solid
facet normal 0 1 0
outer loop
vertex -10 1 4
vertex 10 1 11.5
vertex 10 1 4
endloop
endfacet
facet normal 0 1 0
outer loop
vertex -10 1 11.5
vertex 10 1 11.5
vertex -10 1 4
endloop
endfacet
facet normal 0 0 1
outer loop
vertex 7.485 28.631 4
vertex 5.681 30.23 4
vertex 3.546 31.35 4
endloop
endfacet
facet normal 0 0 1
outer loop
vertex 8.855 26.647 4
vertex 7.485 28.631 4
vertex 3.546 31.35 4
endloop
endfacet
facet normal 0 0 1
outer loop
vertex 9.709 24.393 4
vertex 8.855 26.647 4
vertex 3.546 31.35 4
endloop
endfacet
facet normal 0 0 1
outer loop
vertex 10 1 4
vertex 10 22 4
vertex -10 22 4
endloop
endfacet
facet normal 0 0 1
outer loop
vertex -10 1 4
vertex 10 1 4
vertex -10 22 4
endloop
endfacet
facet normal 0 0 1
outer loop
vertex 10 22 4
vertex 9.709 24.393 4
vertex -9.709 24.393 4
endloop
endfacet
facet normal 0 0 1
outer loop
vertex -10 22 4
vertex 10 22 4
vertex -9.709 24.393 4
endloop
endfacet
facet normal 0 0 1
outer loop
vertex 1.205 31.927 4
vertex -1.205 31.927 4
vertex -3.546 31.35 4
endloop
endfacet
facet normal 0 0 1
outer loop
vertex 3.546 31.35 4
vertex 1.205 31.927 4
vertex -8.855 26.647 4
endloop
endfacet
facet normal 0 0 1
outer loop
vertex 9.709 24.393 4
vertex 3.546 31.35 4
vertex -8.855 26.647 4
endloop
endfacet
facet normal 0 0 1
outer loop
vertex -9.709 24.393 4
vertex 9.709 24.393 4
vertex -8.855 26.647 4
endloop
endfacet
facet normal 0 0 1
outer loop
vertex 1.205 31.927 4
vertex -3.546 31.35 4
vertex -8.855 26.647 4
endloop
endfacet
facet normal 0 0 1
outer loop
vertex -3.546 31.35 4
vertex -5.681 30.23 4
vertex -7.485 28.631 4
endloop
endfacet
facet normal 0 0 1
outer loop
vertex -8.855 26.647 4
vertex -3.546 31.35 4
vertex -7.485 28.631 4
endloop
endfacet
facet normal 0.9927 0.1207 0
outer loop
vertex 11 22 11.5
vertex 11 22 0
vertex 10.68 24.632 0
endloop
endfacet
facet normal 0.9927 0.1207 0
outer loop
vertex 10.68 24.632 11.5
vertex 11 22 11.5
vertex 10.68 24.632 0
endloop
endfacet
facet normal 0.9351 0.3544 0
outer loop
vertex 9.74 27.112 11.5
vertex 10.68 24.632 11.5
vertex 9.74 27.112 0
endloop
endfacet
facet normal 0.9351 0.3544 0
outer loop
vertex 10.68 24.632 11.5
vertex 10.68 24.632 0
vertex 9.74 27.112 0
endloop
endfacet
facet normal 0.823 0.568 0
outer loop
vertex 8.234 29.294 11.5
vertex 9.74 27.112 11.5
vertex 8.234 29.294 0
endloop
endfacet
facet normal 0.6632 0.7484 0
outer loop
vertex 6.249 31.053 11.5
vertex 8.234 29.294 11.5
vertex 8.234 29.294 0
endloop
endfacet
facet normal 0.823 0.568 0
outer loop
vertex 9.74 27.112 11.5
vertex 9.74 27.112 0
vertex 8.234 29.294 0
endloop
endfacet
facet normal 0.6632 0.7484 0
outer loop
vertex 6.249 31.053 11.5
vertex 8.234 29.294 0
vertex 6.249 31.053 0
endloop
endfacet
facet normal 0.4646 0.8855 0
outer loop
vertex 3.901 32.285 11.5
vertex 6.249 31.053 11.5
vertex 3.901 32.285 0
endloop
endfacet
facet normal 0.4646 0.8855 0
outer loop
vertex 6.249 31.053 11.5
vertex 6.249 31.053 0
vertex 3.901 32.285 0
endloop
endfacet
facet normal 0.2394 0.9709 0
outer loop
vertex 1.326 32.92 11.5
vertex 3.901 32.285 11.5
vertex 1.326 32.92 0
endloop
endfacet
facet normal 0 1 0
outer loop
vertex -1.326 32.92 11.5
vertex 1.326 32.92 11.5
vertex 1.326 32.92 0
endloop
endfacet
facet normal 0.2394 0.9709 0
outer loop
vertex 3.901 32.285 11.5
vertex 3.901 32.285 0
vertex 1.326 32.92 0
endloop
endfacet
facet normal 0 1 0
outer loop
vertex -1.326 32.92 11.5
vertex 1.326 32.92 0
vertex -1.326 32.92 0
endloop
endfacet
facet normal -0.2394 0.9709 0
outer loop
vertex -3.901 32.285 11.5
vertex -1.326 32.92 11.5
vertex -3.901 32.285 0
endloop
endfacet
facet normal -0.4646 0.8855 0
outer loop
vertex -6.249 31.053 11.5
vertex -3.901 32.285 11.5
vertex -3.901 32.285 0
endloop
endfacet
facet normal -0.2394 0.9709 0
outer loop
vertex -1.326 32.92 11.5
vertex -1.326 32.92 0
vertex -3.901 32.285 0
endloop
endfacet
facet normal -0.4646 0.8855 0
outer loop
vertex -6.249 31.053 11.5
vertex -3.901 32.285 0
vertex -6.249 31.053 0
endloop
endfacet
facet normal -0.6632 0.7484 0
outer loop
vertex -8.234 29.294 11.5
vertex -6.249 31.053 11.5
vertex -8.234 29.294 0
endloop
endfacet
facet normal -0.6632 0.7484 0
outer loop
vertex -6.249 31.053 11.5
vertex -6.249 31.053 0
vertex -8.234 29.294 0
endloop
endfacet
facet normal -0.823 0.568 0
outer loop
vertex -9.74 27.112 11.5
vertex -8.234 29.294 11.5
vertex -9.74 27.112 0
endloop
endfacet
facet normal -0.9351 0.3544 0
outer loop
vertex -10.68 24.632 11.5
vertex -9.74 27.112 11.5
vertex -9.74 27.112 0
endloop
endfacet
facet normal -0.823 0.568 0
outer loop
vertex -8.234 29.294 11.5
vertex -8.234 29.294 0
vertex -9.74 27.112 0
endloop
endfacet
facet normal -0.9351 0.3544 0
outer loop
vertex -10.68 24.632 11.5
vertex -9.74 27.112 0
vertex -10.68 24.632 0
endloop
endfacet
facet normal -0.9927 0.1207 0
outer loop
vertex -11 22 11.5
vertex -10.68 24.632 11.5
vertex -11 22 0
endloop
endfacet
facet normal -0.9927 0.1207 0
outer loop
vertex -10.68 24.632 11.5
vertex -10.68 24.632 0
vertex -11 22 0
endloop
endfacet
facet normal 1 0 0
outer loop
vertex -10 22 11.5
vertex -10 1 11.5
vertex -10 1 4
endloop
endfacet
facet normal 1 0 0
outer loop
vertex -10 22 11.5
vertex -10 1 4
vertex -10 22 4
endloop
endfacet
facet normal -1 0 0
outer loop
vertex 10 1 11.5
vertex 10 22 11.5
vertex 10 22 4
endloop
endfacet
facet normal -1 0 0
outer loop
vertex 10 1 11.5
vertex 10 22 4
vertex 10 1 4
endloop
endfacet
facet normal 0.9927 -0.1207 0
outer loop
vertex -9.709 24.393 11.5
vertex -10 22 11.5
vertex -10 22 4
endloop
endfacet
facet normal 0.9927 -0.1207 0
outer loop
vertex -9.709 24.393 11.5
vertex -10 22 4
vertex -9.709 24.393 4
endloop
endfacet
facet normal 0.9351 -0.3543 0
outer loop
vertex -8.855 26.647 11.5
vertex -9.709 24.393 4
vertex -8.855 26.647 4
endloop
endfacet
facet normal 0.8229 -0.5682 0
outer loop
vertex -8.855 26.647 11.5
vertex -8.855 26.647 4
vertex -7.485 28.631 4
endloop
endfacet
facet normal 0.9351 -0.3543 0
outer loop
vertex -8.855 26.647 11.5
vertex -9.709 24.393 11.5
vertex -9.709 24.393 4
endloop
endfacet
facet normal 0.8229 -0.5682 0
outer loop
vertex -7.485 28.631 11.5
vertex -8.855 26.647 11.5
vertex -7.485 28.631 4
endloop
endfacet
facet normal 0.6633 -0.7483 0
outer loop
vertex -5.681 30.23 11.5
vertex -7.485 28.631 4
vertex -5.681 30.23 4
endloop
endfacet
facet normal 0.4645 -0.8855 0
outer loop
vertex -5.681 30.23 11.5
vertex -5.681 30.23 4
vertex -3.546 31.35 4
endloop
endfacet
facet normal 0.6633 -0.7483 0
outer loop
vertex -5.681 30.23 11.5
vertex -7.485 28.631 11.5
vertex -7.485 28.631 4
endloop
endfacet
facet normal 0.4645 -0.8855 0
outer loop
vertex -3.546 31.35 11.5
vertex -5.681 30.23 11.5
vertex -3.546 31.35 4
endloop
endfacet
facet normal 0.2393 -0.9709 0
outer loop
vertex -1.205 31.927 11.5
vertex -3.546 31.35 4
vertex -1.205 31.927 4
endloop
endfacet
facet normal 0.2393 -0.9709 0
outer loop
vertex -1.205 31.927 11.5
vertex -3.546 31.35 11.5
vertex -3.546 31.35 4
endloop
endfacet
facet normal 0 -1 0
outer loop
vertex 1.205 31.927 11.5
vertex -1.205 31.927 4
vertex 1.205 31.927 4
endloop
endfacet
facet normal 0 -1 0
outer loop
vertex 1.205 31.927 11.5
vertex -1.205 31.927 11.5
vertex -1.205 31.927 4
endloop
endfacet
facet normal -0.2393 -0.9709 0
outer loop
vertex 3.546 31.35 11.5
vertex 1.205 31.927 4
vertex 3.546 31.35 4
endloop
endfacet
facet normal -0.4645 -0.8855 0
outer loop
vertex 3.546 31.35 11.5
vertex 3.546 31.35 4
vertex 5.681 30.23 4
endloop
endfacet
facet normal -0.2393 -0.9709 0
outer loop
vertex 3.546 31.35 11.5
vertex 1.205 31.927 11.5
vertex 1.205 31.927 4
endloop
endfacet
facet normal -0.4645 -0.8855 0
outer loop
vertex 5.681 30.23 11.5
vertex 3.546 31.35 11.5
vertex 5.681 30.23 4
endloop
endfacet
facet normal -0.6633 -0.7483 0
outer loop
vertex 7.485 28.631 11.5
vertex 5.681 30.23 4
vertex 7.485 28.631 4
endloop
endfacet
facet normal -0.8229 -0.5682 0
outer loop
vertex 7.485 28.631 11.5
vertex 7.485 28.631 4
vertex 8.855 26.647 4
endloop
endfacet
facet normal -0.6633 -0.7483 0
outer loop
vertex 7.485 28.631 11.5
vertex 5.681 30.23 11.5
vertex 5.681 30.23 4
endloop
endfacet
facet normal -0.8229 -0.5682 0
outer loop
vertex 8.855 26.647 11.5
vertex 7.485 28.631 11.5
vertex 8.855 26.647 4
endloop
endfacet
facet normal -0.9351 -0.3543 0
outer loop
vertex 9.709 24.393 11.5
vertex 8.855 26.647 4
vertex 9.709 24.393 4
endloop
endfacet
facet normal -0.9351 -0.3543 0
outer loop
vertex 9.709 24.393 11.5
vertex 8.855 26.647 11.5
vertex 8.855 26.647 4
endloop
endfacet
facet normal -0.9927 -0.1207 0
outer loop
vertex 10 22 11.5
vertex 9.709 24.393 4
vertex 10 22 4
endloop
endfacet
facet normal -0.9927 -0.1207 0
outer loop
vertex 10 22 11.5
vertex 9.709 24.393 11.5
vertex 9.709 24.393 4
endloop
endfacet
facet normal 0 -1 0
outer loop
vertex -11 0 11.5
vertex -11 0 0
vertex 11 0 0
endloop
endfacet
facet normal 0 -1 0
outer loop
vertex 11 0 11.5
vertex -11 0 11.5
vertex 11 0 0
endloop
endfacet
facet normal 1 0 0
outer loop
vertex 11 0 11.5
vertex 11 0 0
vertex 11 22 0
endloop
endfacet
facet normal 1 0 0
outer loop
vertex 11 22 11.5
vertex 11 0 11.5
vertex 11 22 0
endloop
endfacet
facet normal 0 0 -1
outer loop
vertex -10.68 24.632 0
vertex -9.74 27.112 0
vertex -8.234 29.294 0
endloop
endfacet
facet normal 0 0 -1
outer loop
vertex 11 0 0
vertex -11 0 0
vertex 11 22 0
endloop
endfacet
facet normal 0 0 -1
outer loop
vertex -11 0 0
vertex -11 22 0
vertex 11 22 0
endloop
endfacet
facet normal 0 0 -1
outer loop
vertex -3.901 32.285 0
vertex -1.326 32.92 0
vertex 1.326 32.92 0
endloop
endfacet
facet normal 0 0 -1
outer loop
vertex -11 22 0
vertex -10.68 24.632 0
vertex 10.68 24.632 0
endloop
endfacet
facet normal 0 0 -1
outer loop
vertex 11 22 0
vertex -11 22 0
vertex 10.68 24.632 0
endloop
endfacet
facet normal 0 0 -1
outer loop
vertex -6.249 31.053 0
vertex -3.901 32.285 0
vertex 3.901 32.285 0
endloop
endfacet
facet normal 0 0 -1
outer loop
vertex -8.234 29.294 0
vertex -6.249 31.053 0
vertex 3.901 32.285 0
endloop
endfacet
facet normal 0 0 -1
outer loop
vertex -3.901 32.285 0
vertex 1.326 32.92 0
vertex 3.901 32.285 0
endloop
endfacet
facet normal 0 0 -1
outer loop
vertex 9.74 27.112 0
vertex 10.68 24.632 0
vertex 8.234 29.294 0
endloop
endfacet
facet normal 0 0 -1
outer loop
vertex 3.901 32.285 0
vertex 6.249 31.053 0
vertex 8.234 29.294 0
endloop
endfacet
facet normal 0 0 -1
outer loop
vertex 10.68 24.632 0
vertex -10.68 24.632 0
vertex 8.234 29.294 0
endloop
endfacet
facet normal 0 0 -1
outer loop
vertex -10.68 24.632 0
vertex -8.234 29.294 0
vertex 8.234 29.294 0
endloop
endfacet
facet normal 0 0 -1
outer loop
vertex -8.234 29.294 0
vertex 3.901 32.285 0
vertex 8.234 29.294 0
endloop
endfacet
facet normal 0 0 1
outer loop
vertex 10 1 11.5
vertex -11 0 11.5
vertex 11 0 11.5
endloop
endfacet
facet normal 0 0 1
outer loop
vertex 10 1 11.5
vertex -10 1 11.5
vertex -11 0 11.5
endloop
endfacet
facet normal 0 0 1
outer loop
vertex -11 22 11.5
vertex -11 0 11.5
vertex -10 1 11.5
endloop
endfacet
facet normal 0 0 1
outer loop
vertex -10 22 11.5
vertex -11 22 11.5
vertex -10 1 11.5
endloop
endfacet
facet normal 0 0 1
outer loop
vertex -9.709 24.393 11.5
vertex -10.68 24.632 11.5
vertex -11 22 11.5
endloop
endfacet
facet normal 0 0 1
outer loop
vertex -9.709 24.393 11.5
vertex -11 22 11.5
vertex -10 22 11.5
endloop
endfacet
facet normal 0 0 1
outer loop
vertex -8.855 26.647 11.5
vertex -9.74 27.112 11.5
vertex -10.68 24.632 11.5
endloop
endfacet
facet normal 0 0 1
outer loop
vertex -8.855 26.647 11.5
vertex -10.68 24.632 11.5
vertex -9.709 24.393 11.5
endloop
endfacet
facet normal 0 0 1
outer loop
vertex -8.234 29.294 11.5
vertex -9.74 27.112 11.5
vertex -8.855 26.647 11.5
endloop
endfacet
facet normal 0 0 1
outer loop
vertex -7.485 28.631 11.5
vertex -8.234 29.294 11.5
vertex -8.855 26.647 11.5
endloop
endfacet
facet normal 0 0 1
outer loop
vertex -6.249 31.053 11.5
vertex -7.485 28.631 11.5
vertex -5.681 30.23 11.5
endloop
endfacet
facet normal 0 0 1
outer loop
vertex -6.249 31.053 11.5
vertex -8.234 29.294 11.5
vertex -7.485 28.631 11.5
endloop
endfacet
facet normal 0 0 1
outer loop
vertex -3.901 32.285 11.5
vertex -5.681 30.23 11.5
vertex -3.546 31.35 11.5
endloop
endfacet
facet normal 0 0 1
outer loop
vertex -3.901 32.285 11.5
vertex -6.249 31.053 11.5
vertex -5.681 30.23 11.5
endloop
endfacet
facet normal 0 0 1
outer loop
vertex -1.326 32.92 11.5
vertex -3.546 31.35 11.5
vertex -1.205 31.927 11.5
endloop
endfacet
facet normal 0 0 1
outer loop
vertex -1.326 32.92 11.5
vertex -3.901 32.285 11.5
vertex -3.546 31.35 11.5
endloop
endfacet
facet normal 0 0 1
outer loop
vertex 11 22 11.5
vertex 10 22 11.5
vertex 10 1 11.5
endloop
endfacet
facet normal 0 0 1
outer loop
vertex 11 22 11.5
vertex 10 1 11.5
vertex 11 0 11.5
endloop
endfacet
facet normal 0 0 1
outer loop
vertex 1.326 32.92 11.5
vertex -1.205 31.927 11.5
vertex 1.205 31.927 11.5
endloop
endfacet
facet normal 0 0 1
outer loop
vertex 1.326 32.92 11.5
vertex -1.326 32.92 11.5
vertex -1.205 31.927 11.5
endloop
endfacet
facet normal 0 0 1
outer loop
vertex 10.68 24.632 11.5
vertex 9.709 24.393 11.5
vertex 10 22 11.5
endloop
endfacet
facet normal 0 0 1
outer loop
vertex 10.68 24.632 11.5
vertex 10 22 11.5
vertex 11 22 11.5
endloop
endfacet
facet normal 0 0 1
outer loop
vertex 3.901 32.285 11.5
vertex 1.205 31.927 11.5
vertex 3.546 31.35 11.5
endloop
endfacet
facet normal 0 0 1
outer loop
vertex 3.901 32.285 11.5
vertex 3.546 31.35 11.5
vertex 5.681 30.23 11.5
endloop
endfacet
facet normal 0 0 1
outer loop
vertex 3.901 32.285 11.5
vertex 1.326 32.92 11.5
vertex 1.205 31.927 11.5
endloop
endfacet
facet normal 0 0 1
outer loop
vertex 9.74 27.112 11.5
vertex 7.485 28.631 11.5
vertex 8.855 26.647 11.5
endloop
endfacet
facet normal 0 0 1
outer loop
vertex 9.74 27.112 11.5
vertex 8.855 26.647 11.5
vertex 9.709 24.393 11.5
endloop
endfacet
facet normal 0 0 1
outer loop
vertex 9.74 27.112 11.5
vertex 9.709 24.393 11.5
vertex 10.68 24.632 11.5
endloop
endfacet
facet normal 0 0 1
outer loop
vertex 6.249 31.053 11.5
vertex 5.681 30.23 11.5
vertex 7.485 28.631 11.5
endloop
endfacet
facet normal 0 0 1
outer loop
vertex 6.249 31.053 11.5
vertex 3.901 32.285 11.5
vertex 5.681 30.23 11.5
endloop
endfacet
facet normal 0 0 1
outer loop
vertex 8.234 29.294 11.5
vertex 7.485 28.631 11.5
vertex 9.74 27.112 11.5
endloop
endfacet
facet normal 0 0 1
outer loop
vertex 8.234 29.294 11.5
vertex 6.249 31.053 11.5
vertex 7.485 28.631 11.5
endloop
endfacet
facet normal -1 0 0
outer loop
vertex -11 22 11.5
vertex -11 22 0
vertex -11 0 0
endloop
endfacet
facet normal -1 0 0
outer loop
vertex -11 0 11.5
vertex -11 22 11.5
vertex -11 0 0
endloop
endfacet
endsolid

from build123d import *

# Parameters (mm, degrees)
BOSS_EXTRU_1_DEPTH      = 11.5
ENL_V_MAT_EXTRU_1_DEPTH = 7.5


with BuildPart() as part:
    # Esquisse1 → Boss.-Extru.1 (new body)
    with BuildSketch(Plane.XY):
        with BuildLine():
            Line((-11, 0), (11, 0))
            Line((11, 0), (11, 22))
            ThreePointArc((11, 22), (0, 33), (-11, 22))
            Line((-11, 22), (-11, 0))
        make_face()
    extrude(amount=BOSS_EXTRU_1_DEPTH)

    # Esquisse2 → Enlèv. mat.-Extru.1 (cut)
    with BuildSketch(Plane.XY.offset(11.5)):
        with BuildLine():
            Line((-10, 1), (-10, 22))
            ThreePointArc((-10, 22), (0, 32), (10, 22))
            Line((10, 22), (10, 1))
            Line((10, 1), (-10, 1))
        make_face()
    extrude(amount=-ENL_V_MAT_EXTRU_1_DEPTH, mode=Mode.SUBTRACT)


solid = part.part
